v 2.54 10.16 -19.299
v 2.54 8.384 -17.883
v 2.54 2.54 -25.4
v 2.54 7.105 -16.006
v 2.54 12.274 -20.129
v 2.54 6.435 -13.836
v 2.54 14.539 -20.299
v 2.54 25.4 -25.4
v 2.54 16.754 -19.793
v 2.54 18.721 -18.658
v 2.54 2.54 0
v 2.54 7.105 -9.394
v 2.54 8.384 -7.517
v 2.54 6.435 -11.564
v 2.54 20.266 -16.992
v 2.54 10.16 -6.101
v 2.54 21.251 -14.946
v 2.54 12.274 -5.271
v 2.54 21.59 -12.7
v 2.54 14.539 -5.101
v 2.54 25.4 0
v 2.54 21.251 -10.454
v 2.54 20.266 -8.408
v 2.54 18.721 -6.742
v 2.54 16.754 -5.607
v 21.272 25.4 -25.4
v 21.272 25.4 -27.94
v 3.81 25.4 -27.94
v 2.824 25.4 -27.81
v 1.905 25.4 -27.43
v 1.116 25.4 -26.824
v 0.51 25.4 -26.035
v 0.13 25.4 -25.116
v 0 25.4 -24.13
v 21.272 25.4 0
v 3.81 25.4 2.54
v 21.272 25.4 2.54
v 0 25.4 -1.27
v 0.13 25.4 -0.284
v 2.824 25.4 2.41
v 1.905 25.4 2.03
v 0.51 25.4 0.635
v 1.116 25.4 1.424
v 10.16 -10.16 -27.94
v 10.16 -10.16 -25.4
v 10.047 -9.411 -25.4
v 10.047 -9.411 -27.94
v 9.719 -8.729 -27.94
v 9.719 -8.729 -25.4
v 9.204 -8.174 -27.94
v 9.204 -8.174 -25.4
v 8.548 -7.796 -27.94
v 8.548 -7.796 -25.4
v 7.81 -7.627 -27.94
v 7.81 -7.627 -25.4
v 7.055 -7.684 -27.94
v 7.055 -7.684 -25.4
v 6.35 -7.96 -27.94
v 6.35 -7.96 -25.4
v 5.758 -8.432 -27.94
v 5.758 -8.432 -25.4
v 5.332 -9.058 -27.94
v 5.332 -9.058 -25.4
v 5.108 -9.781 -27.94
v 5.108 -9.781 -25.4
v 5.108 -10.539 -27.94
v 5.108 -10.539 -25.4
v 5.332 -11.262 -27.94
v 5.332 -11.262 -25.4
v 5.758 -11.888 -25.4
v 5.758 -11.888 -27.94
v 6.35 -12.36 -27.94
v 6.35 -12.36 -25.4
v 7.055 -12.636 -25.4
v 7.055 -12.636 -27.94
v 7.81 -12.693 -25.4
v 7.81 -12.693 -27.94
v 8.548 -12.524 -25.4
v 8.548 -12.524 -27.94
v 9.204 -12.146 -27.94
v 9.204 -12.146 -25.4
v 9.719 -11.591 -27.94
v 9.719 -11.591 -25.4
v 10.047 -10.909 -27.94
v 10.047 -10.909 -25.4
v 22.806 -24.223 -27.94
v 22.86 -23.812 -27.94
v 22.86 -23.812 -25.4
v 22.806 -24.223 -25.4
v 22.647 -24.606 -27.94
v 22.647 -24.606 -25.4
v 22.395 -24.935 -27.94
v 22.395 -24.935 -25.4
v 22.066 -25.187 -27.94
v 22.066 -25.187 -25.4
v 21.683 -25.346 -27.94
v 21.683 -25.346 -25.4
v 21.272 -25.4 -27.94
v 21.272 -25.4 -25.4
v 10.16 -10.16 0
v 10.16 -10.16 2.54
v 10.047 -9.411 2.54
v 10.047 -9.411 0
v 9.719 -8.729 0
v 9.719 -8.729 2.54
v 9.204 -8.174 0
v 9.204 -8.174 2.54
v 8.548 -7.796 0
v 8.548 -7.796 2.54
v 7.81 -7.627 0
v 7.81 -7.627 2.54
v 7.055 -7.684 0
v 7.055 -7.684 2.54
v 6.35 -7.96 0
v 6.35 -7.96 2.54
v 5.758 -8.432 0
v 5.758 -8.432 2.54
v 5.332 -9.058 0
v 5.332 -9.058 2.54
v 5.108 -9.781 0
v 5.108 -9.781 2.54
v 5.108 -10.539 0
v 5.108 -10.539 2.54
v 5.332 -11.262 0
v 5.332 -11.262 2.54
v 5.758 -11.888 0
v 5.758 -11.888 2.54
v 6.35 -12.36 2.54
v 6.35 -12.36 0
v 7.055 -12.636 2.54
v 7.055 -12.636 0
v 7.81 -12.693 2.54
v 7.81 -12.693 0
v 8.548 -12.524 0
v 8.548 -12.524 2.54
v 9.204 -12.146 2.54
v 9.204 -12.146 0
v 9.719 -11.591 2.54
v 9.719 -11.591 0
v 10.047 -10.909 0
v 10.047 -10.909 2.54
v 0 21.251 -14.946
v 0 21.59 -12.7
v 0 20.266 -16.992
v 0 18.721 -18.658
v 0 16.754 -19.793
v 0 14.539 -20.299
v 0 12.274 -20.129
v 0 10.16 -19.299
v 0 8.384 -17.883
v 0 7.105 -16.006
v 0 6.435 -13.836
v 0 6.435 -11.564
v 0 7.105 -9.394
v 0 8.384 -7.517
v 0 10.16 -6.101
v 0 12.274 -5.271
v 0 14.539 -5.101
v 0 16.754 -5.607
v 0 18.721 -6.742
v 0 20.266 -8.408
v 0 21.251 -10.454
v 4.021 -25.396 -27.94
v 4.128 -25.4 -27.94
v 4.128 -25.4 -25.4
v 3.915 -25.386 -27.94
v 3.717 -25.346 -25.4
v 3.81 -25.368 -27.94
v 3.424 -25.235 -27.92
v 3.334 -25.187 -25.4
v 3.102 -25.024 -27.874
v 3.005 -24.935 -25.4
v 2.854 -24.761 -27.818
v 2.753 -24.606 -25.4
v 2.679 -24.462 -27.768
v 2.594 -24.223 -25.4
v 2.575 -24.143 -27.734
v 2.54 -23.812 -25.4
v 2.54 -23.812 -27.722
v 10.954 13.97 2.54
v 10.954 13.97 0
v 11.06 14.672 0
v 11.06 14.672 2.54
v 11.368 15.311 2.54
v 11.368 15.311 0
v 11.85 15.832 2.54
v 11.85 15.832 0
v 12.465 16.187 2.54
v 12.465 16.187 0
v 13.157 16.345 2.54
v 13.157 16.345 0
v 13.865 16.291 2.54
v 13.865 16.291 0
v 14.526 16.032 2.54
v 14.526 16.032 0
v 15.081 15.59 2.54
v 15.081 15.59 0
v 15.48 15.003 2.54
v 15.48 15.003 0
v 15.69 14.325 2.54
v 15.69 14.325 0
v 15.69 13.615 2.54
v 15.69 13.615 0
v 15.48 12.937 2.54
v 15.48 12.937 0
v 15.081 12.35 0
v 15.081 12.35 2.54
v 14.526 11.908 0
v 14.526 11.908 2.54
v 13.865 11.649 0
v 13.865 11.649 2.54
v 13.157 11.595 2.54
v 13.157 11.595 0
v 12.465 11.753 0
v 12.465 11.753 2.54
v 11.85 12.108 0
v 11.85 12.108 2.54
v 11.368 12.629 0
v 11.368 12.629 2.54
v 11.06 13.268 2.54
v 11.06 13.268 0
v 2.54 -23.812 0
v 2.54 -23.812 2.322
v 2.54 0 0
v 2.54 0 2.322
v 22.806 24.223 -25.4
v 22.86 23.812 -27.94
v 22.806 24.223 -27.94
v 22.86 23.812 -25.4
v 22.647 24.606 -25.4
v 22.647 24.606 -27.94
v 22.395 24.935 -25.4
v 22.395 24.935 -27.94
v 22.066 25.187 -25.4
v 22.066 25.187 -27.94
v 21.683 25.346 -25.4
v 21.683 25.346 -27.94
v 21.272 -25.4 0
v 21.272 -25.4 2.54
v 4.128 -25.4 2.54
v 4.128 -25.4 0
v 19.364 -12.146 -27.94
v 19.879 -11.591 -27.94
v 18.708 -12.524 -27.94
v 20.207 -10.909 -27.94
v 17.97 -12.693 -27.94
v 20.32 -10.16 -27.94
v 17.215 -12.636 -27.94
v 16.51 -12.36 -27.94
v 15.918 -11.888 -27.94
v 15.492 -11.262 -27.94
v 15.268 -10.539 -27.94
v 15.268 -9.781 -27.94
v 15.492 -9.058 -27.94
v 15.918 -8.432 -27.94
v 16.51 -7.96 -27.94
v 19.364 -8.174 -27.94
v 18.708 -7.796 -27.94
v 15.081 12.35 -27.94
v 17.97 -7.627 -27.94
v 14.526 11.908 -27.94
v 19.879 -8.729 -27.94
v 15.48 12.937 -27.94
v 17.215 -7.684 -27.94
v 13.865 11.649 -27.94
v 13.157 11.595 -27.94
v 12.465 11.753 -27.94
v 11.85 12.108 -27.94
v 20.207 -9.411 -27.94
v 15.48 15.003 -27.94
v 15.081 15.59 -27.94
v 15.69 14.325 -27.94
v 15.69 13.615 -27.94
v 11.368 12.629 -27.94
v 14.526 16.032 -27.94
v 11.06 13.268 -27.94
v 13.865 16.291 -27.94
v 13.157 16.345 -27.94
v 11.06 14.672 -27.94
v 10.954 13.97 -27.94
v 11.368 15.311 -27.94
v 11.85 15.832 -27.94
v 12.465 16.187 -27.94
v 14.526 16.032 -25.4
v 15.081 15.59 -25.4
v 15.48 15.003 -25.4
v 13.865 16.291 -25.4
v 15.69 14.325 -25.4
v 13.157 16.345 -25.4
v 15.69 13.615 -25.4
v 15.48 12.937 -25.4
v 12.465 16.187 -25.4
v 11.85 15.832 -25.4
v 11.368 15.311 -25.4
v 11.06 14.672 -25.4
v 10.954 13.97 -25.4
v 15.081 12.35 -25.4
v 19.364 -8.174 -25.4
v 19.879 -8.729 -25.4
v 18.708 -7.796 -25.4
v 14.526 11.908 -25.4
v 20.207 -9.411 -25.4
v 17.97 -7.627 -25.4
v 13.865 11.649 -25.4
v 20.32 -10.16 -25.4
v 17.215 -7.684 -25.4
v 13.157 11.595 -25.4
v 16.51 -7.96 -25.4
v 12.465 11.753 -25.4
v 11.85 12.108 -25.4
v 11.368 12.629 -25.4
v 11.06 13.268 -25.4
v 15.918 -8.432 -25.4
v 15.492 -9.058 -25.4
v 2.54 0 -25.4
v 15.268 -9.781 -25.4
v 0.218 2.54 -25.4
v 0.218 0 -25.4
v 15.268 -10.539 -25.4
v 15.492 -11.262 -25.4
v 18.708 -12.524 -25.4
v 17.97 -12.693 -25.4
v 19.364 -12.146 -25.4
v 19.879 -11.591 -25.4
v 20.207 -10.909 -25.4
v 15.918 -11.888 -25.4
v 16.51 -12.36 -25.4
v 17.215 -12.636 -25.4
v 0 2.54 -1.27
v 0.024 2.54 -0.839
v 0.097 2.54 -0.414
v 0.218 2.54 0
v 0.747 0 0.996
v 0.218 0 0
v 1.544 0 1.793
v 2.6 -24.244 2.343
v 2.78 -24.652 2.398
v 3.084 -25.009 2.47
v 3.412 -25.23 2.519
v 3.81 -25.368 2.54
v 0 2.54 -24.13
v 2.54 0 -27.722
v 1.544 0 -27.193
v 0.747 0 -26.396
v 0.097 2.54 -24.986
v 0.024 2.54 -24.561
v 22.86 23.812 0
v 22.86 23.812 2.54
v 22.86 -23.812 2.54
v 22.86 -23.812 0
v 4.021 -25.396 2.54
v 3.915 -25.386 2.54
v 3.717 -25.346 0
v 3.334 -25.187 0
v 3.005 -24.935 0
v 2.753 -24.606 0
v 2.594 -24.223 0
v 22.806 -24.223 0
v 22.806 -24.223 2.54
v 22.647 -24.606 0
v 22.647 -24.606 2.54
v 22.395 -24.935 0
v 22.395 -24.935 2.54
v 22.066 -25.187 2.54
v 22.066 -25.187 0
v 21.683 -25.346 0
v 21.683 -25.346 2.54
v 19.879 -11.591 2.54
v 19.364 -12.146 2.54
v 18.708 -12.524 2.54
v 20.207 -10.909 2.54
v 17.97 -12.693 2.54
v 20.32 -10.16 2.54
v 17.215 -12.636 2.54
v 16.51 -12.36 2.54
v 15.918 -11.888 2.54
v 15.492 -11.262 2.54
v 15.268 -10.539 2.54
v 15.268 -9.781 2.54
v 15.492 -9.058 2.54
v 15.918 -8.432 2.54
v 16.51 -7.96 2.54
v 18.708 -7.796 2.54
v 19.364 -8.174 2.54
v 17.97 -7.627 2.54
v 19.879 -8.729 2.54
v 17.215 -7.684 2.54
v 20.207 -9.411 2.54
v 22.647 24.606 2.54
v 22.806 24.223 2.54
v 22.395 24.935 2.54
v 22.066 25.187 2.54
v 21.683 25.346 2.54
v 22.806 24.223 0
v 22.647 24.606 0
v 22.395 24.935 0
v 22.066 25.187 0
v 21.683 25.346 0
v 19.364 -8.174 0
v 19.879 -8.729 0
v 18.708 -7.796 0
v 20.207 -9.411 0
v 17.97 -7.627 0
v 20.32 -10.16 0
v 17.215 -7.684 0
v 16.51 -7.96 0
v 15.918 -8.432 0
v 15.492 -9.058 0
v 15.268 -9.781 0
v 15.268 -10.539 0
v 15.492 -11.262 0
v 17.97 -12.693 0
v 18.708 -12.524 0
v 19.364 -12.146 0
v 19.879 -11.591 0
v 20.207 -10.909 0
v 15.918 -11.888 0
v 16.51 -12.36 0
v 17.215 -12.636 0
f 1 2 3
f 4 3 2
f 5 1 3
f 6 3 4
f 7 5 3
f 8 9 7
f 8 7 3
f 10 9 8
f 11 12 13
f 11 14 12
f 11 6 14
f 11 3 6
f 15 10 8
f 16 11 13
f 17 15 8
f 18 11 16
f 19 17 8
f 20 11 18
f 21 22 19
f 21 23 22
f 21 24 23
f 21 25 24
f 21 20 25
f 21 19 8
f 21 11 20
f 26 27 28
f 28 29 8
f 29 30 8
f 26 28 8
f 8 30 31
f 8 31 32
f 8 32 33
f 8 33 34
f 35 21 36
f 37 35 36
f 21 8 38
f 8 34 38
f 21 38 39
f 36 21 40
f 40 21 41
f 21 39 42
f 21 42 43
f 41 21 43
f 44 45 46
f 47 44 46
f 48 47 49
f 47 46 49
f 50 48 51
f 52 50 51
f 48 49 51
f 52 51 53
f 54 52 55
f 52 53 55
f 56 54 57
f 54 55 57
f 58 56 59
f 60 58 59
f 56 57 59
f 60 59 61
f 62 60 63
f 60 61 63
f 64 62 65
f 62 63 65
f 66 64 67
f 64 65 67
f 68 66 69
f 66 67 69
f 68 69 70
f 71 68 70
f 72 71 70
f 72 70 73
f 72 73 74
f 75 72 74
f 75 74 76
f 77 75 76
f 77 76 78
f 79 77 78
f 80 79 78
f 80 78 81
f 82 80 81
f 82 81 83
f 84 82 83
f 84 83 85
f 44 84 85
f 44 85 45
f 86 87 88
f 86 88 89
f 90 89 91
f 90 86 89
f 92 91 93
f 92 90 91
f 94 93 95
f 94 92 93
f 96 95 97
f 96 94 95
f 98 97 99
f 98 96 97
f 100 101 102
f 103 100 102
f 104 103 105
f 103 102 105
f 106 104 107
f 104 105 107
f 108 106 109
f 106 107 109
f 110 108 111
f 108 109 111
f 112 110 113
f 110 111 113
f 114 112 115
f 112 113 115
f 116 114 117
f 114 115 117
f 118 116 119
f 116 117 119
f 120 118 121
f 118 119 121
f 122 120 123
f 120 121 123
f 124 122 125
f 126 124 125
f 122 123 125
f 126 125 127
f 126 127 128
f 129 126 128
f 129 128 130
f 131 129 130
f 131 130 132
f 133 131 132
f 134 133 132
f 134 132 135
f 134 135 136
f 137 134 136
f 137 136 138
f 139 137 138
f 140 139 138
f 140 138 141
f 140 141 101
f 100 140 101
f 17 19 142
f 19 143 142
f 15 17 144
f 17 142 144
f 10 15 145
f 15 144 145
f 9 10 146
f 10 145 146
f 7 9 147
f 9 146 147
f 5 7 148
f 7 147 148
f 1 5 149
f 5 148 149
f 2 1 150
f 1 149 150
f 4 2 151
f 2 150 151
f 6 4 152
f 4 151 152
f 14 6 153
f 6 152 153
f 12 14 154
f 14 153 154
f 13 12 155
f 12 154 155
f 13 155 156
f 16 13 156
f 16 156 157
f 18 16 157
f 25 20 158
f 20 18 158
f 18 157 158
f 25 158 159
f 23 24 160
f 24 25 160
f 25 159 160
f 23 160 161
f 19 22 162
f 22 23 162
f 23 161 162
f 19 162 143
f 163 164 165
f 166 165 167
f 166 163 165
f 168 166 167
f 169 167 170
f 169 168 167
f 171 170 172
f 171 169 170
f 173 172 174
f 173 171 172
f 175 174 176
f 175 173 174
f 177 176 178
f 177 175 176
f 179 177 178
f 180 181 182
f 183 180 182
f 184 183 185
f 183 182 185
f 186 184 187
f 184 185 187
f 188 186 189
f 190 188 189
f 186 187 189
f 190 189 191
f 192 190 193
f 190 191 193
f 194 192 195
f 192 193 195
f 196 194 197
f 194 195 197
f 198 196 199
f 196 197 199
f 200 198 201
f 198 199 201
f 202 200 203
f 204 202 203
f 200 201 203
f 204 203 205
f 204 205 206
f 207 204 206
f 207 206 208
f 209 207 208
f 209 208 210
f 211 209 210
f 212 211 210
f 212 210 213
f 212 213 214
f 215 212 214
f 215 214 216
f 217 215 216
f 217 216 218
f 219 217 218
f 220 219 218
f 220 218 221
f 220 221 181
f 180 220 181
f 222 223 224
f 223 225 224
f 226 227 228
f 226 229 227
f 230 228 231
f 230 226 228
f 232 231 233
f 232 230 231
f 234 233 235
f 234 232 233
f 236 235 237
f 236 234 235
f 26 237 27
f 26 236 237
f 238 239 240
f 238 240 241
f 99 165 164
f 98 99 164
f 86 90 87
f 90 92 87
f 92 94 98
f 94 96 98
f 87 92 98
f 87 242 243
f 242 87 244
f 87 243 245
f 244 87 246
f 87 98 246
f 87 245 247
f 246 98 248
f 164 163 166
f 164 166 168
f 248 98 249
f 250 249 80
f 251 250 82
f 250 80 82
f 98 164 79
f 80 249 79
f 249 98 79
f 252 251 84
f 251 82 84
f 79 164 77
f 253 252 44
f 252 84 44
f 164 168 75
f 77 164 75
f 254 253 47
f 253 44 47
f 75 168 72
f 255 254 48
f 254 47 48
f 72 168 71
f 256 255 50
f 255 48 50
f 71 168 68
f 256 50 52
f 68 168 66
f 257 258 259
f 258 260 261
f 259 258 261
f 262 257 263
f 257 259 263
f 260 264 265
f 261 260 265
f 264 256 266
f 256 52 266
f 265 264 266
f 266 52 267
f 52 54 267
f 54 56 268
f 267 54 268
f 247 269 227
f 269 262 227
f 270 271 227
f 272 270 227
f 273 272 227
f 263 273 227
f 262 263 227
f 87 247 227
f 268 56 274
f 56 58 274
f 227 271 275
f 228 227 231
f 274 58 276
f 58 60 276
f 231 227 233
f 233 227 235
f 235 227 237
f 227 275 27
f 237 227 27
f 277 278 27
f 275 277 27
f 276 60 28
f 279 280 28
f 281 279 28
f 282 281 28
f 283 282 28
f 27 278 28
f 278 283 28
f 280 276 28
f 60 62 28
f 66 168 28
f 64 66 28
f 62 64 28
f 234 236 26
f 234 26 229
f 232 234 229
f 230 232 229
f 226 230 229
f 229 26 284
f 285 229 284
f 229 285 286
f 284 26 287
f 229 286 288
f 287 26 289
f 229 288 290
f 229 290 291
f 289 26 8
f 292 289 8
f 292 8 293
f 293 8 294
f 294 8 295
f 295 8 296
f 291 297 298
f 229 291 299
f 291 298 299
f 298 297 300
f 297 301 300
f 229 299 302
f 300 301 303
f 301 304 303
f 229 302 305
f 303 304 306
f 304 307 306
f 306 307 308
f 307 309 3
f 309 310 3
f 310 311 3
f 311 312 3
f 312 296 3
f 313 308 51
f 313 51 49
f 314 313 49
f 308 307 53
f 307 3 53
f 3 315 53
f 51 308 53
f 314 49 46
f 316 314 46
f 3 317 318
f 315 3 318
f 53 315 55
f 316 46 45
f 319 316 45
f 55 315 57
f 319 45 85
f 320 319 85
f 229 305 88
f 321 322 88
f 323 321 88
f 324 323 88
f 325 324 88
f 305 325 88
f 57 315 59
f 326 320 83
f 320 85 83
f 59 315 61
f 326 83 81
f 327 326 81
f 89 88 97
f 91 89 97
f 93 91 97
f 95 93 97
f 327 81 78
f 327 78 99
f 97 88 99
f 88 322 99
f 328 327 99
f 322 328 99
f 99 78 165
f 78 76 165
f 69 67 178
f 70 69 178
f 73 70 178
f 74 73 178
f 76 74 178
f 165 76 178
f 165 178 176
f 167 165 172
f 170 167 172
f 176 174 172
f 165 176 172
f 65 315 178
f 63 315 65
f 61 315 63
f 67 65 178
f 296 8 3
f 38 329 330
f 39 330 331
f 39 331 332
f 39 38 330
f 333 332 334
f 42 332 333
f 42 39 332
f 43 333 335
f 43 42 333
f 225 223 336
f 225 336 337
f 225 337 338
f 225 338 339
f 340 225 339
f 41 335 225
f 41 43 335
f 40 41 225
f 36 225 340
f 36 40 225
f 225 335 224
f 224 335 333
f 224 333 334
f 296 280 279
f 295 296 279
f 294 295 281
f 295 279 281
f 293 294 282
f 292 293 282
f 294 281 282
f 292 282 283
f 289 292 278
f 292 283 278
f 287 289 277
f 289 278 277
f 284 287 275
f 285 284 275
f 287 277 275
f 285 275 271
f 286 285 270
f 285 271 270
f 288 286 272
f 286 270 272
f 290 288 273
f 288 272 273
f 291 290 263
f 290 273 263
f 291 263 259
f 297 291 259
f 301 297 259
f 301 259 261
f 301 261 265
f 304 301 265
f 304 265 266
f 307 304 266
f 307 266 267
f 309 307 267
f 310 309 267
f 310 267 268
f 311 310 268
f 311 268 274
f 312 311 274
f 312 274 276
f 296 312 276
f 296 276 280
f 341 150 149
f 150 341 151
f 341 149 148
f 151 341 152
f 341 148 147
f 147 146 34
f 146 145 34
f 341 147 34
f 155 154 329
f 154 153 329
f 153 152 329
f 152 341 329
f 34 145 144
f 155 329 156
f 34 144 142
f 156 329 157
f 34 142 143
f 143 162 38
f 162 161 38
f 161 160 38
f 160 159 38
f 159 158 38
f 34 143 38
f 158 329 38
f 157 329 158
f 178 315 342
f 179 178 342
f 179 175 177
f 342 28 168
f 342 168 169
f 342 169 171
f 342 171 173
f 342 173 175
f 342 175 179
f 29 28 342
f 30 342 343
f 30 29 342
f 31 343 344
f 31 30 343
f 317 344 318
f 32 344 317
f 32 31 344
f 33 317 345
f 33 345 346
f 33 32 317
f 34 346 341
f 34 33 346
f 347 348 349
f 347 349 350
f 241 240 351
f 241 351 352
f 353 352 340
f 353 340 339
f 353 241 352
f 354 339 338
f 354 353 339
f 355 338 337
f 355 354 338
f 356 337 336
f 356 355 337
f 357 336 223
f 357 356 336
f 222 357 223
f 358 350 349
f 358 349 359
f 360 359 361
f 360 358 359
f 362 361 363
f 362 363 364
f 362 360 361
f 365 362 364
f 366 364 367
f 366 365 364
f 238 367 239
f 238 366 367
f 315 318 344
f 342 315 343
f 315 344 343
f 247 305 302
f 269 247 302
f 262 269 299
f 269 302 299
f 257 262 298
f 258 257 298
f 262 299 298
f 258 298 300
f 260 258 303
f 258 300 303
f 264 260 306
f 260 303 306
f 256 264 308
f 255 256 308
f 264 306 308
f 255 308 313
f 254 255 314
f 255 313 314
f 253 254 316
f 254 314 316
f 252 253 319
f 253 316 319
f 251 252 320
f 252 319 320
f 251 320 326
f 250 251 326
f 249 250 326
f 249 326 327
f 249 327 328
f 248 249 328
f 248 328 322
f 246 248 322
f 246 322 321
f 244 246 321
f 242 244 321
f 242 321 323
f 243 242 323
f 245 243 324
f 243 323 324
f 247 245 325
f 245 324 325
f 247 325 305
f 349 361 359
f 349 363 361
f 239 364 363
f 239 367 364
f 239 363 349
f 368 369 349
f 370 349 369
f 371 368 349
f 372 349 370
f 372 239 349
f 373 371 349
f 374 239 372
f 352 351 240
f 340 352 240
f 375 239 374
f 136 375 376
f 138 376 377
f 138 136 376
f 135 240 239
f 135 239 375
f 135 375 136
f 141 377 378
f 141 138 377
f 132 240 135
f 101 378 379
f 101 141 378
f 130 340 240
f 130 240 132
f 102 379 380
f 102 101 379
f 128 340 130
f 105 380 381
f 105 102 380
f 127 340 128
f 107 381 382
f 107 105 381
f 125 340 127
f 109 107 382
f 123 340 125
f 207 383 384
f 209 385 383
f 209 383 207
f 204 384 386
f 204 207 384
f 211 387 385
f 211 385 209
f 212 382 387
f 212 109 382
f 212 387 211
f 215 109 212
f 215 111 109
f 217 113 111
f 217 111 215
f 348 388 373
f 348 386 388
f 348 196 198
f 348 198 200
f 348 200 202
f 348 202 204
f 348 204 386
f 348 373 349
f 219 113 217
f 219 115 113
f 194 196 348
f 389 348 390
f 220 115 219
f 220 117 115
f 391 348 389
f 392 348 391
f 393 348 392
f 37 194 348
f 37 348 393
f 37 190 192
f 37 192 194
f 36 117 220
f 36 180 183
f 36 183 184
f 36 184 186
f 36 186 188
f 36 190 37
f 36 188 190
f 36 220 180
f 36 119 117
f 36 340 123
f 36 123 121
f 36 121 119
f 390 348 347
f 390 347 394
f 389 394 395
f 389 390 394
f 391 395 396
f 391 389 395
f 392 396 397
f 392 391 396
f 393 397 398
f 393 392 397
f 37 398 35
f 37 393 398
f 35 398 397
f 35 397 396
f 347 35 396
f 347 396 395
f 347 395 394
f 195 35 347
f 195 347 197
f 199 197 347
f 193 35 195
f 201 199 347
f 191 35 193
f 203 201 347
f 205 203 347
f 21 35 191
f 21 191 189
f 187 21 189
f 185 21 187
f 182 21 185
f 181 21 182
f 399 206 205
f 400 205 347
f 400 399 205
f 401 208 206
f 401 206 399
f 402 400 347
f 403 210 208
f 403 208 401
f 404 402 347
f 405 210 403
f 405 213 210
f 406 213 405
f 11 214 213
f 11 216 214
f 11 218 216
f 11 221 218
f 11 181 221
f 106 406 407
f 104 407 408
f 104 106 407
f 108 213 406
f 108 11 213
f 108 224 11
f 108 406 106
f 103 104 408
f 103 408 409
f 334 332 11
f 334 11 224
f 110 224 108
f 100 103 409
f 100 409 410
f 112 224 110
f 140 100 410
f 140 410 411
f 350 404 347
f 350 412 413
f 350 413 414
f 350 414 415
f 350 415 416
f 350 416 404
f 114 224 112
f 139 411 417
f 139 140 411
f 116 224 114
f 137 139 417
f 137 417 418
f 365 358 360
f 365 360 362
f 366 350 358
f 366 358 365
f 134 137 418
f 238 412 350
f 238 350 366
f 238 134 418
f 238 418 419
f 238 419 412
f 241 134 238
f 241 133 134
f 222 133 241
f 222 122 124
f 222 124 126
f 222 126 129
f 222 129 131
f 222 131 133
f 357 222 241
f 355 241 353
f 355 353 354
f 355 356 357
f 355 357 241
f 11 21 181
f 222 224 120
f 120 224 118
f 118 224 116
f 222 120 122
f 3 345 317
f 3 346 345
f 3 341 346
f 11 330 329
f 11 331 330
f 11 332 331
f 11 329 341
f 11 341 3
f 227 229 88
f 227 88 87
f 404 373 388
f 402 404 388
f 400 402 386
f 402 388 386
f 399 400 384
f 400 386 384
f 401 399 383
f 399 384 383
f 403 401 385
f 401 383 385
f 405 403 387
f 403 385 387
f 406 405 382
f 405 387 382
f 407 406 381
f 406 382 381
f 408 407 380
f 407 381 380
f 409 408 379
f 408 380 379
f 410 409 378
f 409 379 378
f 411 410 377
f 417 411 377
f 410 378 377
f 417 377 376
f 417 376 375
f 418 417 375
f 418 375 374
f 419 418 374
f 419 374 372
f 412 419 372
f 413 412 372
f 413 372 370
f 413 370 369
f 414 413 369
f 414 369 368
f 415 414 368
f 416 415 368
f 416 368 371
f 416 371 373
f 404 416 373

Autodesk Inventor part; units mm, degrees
ref_plane "YZ Plane" through (0, 0, 0) normal (1, 0, 0) x (0, 1, 0)
ref_plane "XZ Plane" through (0, 0, 0) normal (0, 1, 0) x (-1, 0, 0)
ref_plane "XY Plane" through (0, 0, 0) normal (0, 0, 1) x (1, 0, 0)
sketch "Sketch1" plane through (0, 0, 0) normal (1, 0, 0) x (0, 1, 0)
  line L0 (0, 0) -> (0, -25.4)
  line L1 (0, -25.4) -> (25.4, -25.4)
  line L2 (25.4, -25.4) -> (25.4, 0)
  line L3 (25.4, 0) -> (0, 0)
  line L4 (0, 0) -> (0, 2.54)
  line L5 (0, 2.54) -> (25.4, 2.54)
  line L6 (25.4, 2.54) -> (25.4, 0)
  line L7 (0, -25.4) -> (0, -27.94)
  line L8 (0, -27.94) -> (25.4, -27.94)
  line L9 (25.4, -27.94) -> (25.4, -25.4)
  circle A0 centre (13.97, -12.7) radius 7.62
  dimension "d0" = 25.4
  dimension "d1" = 25.4
  dimension "d2" = 2.54
  dimension "d3" = 2.54
ref_plane "Work Plane2" through (2.54, 0, 0) normal (1, 0, 0) x (0, 0, -1)
sketch "Sketch2" plane through (2.54, 0, 0) normal (1, 0, 0) x (0, 0, -1)
  line L0 (27.94, 25.4) -> (-2.54, 25.4) projected
  line L1 (0, 25.4) -> (0, 0)
  line L2 (-2.54, 25.4) -> (0, 25.4)
  line L3 (-2.54, 25.4) -> (-2.54, 0)
  line L4 (25.4, 0) -> (25.4, 25.4)
  line L5 (27.94, 0) -> (27.94, 25.4) projected
  line L6 (25.4, 25.4) -> (27.94, 25.4)
  line L7 (27.94, 25.4) -> (27.94, 0)
  line L8 (25.4, 0) -> (25.4, -25.4)
  line L9 (25.4, -25.4) -> (27.94, -25.4)
  line L10 (27.94, -25.4) -> (27.94, 0)
  line L11 (-2.54, 0) -> (-2.54, -25.4)
  line L12 (-2.54, -25.4) -> (0, -25.4)
  line L13 (0, -25.4) -> (0, 0)
  dimension "d10" = 2.54
  dimension "d11" = 25.4
  dimension "d12" = 25.4
extrude "Extrusion2" add sketch "Sketch2" along normal blind 20.32
extrude "Extrusion3" add sketch "Sketch1" along normal blind 2.54
sketch "Sketch3" plane through (2.54, -25.4, 2.54) normal (0, 0, 1) x (1, 0, 0)
  line L0 (0, 0) -> (0, 25.4) projected
  circle A0 centre (5.08, 15.24) radius 2.54
  circle A1 centre (15.24, 15.24) radius 2.54
  point P0 (-2.54, 25.4)
extrude "Extrusion4" cut sketch "Sketch3" against normal blind 40.3225
fillet "Fillet1" radius 1.5875 1 edges at (22.86, -25.4, 1.27)
fillet "Fillet2" radius 1.5875 1 edges at (22.86, -25.4, -26.67)
fillet "Fillet3" radius 1.5875 1 edges at (22.86, 25.4, 1.27)
fillet "Fillet4" radius 1.5875 1 edges at (22.86, 25.4, -26.67)
fillet "Fillet5" radius 1.5875 2 edges at (2.54, -25.4, 1.27) (2.54, -25.4, -26.67)
fillet "Fillet6" radius 3.81 2 edges at (0, 12.7, -27.94) (0, 12.7, 2.54)
sketch "Sketch4" plane through (2.54, 0, -25.4) normal (0, -1, 0) x (1, 0, 0)
  line L0 (0, 25.4) -> (0, 0) projected
  line L1 (0, 25.4) -> (0, 0)
  line L2 (0, 0) -> (-2.54, 0)
  line L3 (-2.54, 0) -> (-2.54, 25.4)
  line L4 (-2.54, 25.4) -> (0, 25.4)
extrude "Extrusion5" cut sketch "Sketch4" against normal blind 2.54
sketch "Sketch5" plane through (22.86, -23.8125, -27.94) normal (0, 0, -1) x (-1, 0, 0)
  line L0 (22.86, 26.3525) -> (22.86, 49.2125) projected
  line L1 (0, 47.625) -> (0, 0) projected
  line L2 (19.05, 49.2125) -> (19.05, -1.5554) projected
  circle A0 centre (9.525, 37.7825) radius 2.3812
  point P0 (22.86, 23.8125)
  dimension "d35" = 4.7625
extrude "Extrusion6" cut sketch "Sketch5" against normal blind 38.735
properties part number "Inline Cylinder Mount Bracket" material "Steel, Alloy"
